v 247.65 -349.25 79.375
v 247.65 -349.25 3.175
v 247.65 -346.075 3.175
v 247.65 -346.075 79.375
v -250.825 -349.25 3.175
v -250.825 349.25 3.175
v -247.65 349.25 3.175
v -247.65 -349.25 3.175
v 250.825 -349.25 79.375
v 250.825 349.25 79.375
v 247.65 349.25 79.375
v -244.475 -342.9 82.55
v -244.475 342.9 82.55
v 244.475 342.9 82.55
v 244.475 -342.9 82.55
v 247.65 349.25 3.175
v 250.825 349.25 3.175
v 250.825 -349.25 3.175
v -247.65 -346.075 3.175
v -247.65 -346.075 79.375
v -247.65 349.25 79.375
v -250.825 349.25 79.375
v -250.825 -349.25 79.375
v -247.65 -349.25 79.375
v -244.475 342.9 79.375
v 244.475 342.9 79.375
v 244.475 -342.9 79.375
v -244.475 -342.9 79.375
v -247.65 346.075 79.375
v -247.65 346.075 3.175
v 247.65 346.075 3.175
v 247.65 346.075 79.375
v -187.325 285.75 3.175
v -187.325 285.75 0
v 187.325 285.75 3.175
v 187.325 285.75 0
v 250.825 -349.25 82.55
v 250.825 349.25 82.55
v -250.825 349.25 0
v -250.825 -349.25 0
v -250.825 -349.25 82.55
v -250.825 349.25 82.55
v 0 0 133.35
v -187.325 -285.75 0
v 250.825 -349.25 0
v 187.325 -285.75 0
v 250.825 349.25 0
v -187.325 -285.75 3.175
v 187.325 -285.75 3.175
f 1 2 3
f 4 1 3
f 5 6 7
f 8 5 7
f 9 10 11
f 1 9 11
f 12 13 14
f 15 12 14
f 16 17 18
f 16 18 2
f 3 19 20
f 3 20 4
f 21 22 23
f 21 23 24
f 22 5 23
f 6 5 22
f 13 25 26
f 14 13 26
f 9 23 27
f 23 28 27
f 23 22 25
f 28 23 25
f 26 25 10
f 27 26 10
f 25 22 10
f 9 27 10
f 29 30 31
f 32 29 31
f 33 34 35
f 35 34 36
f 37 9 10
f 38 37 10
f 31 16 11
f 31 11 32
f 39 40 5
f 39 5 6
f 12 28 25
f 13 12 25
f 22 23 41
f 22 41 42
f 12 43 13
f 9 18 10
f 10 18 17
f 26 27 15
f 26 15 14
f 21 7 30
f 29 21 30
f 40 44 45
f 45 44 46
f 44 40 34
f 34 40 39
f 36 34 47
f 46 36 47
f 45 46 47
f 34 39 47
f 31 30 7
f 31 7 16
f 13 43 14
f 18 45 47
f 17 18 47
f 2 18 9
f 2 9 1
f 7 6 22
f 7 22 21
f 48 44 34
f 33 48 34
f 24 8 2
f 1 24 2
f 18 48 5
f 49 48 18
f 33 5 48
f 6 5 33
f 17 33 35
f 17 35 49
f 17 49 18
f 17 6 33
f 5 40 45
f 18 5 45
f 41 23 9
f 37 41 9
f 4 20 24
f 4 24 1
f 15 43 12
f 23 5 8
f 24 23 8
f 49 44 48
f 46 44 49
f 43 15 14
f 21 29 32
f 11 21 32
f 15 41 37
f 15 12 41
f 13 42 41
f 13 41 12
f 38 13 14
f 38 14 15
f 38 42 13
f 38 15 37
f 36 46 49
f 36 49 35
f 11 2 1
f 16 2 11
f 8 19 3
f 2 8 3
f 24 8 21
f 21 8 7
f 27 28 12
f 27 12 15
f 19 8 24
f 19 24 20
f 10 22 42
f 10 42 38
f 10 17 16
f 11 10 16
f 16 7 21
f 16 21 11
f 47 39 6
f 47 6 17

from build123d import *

# Parameters (mm, degrees)
F0_W      = 501.65
F0_H      = 698.5
F0_W_2    = 450.85
F0_H_2    = 647.7
F0_W_3    = 374.65
F0_H_3    = 571.5
F1_DEPTH  = 3.175
F2_W      = 3.175
F2_H      = 698.5
F3_DEPTH  = 76.2
F5_W      = 495.3
F5_H      = 3.175
F6_DEPTH  = 76.2
F8_W      = 501.65
F8_H      = 698.5
F8_W_2    = 488.95
F8_H_2    = 685.8
F9_DEPTH  = 3.175
F11_DEPTH = 685.8
F13_DEPTH = 501.651


# Not quite as in the source:
# - a pattern or mirror of a feature is missing from the dataset's text; its kind, count and spacing are read off the source's solid
# - a feature names something its author has since deleted; it is built from what else it names


with BuildPart() as f1:
    # F0 (on Top) → F1 (new body)
    with BuildSketch(Plane.XY):
        Rectangle(F0_W, F0_H)
        Rectangle(F0_W_2, F0_H_2, mode=Mode.SUBTRACT)
        Rectangle(F0_W_2, F0_H_2)
        Rectangle(F0_W_3, F0_H_3, mode=Mode.SUBTRACT)
    extrude(amount=F1_DEPTH)


with BuildPart() as f3:
    # F2 (on face) → F3 (new body)
    with BuildSketch(Plane.XY.offset(3.175)):
        with Locations((-249.2375, 0)):
            Rectangle(F2_W, F2_H)
    extrude(amount=F3_DEPTH)


with BuildPart() as f4_1:
    # F4: instance of F3
    add(f3.part.mirror(Plane.YZ))


with BuildPart() as f6:
    # F5 (on face) → F6 (new body, through all)
    with BuildSketch(Plane.XY.offset(3.175)):
        with Locations((0, -347.6625)):
            Rectangle(F5_W, F5_H)
    extrude(amount=F6_DEPTH)


with BuildPart() as f7_1:
    # F7: instance of F6
    add(f6.part.mirror(Plane.XZ))


with BuildPart() as f9:
    # F8 (on face) → F9 (new body)
    with BuildSketch(Plane.XY.offset(79.375)):
        Rectangle(F8_W, F8_H)
        Rectangle(F8_W_2, F8_H_2, mode=Mode.SUBTRACT)
    extrude(amount=F9_DEPTH)


with BuildPart() as f11:
    # F10 (on face) → F11 (new body, through all)
    with BuildSketch(Plane.XZ.offset(-342.9)):
        Polygon((0, 133.35), (-244.475, 82.55), (0, 82.55), align=None)
        Polygon((244.475, 82.55), (0, 133.35), (0, 82.55), align=None)
    extrude(amount=F11_DEPTH)

    # F12 (on face) → F13 (cut, through all)
    with BuildSketch(Plane.YZ.offset(250.825)):
        Polygon((0, 133.35), (342.9, 82.55), (342.9, 133.35), align=None)
    f13 = extrude(amount=-F13_DEPTH, mode=Mode.SUBTRACT)

    # F13_copies: F13 across plane
    add(f13.mirror(Plane(origin=(0, 0, 0), x_dir=(0, 0, -1), z_dir=(0, -1, 0))), mode=Mode.SUBTRACT)


solid = Compound([f1.part, f3.part, f4_1.part, f6.part, f7_1.part, f9.part, f11.part])
